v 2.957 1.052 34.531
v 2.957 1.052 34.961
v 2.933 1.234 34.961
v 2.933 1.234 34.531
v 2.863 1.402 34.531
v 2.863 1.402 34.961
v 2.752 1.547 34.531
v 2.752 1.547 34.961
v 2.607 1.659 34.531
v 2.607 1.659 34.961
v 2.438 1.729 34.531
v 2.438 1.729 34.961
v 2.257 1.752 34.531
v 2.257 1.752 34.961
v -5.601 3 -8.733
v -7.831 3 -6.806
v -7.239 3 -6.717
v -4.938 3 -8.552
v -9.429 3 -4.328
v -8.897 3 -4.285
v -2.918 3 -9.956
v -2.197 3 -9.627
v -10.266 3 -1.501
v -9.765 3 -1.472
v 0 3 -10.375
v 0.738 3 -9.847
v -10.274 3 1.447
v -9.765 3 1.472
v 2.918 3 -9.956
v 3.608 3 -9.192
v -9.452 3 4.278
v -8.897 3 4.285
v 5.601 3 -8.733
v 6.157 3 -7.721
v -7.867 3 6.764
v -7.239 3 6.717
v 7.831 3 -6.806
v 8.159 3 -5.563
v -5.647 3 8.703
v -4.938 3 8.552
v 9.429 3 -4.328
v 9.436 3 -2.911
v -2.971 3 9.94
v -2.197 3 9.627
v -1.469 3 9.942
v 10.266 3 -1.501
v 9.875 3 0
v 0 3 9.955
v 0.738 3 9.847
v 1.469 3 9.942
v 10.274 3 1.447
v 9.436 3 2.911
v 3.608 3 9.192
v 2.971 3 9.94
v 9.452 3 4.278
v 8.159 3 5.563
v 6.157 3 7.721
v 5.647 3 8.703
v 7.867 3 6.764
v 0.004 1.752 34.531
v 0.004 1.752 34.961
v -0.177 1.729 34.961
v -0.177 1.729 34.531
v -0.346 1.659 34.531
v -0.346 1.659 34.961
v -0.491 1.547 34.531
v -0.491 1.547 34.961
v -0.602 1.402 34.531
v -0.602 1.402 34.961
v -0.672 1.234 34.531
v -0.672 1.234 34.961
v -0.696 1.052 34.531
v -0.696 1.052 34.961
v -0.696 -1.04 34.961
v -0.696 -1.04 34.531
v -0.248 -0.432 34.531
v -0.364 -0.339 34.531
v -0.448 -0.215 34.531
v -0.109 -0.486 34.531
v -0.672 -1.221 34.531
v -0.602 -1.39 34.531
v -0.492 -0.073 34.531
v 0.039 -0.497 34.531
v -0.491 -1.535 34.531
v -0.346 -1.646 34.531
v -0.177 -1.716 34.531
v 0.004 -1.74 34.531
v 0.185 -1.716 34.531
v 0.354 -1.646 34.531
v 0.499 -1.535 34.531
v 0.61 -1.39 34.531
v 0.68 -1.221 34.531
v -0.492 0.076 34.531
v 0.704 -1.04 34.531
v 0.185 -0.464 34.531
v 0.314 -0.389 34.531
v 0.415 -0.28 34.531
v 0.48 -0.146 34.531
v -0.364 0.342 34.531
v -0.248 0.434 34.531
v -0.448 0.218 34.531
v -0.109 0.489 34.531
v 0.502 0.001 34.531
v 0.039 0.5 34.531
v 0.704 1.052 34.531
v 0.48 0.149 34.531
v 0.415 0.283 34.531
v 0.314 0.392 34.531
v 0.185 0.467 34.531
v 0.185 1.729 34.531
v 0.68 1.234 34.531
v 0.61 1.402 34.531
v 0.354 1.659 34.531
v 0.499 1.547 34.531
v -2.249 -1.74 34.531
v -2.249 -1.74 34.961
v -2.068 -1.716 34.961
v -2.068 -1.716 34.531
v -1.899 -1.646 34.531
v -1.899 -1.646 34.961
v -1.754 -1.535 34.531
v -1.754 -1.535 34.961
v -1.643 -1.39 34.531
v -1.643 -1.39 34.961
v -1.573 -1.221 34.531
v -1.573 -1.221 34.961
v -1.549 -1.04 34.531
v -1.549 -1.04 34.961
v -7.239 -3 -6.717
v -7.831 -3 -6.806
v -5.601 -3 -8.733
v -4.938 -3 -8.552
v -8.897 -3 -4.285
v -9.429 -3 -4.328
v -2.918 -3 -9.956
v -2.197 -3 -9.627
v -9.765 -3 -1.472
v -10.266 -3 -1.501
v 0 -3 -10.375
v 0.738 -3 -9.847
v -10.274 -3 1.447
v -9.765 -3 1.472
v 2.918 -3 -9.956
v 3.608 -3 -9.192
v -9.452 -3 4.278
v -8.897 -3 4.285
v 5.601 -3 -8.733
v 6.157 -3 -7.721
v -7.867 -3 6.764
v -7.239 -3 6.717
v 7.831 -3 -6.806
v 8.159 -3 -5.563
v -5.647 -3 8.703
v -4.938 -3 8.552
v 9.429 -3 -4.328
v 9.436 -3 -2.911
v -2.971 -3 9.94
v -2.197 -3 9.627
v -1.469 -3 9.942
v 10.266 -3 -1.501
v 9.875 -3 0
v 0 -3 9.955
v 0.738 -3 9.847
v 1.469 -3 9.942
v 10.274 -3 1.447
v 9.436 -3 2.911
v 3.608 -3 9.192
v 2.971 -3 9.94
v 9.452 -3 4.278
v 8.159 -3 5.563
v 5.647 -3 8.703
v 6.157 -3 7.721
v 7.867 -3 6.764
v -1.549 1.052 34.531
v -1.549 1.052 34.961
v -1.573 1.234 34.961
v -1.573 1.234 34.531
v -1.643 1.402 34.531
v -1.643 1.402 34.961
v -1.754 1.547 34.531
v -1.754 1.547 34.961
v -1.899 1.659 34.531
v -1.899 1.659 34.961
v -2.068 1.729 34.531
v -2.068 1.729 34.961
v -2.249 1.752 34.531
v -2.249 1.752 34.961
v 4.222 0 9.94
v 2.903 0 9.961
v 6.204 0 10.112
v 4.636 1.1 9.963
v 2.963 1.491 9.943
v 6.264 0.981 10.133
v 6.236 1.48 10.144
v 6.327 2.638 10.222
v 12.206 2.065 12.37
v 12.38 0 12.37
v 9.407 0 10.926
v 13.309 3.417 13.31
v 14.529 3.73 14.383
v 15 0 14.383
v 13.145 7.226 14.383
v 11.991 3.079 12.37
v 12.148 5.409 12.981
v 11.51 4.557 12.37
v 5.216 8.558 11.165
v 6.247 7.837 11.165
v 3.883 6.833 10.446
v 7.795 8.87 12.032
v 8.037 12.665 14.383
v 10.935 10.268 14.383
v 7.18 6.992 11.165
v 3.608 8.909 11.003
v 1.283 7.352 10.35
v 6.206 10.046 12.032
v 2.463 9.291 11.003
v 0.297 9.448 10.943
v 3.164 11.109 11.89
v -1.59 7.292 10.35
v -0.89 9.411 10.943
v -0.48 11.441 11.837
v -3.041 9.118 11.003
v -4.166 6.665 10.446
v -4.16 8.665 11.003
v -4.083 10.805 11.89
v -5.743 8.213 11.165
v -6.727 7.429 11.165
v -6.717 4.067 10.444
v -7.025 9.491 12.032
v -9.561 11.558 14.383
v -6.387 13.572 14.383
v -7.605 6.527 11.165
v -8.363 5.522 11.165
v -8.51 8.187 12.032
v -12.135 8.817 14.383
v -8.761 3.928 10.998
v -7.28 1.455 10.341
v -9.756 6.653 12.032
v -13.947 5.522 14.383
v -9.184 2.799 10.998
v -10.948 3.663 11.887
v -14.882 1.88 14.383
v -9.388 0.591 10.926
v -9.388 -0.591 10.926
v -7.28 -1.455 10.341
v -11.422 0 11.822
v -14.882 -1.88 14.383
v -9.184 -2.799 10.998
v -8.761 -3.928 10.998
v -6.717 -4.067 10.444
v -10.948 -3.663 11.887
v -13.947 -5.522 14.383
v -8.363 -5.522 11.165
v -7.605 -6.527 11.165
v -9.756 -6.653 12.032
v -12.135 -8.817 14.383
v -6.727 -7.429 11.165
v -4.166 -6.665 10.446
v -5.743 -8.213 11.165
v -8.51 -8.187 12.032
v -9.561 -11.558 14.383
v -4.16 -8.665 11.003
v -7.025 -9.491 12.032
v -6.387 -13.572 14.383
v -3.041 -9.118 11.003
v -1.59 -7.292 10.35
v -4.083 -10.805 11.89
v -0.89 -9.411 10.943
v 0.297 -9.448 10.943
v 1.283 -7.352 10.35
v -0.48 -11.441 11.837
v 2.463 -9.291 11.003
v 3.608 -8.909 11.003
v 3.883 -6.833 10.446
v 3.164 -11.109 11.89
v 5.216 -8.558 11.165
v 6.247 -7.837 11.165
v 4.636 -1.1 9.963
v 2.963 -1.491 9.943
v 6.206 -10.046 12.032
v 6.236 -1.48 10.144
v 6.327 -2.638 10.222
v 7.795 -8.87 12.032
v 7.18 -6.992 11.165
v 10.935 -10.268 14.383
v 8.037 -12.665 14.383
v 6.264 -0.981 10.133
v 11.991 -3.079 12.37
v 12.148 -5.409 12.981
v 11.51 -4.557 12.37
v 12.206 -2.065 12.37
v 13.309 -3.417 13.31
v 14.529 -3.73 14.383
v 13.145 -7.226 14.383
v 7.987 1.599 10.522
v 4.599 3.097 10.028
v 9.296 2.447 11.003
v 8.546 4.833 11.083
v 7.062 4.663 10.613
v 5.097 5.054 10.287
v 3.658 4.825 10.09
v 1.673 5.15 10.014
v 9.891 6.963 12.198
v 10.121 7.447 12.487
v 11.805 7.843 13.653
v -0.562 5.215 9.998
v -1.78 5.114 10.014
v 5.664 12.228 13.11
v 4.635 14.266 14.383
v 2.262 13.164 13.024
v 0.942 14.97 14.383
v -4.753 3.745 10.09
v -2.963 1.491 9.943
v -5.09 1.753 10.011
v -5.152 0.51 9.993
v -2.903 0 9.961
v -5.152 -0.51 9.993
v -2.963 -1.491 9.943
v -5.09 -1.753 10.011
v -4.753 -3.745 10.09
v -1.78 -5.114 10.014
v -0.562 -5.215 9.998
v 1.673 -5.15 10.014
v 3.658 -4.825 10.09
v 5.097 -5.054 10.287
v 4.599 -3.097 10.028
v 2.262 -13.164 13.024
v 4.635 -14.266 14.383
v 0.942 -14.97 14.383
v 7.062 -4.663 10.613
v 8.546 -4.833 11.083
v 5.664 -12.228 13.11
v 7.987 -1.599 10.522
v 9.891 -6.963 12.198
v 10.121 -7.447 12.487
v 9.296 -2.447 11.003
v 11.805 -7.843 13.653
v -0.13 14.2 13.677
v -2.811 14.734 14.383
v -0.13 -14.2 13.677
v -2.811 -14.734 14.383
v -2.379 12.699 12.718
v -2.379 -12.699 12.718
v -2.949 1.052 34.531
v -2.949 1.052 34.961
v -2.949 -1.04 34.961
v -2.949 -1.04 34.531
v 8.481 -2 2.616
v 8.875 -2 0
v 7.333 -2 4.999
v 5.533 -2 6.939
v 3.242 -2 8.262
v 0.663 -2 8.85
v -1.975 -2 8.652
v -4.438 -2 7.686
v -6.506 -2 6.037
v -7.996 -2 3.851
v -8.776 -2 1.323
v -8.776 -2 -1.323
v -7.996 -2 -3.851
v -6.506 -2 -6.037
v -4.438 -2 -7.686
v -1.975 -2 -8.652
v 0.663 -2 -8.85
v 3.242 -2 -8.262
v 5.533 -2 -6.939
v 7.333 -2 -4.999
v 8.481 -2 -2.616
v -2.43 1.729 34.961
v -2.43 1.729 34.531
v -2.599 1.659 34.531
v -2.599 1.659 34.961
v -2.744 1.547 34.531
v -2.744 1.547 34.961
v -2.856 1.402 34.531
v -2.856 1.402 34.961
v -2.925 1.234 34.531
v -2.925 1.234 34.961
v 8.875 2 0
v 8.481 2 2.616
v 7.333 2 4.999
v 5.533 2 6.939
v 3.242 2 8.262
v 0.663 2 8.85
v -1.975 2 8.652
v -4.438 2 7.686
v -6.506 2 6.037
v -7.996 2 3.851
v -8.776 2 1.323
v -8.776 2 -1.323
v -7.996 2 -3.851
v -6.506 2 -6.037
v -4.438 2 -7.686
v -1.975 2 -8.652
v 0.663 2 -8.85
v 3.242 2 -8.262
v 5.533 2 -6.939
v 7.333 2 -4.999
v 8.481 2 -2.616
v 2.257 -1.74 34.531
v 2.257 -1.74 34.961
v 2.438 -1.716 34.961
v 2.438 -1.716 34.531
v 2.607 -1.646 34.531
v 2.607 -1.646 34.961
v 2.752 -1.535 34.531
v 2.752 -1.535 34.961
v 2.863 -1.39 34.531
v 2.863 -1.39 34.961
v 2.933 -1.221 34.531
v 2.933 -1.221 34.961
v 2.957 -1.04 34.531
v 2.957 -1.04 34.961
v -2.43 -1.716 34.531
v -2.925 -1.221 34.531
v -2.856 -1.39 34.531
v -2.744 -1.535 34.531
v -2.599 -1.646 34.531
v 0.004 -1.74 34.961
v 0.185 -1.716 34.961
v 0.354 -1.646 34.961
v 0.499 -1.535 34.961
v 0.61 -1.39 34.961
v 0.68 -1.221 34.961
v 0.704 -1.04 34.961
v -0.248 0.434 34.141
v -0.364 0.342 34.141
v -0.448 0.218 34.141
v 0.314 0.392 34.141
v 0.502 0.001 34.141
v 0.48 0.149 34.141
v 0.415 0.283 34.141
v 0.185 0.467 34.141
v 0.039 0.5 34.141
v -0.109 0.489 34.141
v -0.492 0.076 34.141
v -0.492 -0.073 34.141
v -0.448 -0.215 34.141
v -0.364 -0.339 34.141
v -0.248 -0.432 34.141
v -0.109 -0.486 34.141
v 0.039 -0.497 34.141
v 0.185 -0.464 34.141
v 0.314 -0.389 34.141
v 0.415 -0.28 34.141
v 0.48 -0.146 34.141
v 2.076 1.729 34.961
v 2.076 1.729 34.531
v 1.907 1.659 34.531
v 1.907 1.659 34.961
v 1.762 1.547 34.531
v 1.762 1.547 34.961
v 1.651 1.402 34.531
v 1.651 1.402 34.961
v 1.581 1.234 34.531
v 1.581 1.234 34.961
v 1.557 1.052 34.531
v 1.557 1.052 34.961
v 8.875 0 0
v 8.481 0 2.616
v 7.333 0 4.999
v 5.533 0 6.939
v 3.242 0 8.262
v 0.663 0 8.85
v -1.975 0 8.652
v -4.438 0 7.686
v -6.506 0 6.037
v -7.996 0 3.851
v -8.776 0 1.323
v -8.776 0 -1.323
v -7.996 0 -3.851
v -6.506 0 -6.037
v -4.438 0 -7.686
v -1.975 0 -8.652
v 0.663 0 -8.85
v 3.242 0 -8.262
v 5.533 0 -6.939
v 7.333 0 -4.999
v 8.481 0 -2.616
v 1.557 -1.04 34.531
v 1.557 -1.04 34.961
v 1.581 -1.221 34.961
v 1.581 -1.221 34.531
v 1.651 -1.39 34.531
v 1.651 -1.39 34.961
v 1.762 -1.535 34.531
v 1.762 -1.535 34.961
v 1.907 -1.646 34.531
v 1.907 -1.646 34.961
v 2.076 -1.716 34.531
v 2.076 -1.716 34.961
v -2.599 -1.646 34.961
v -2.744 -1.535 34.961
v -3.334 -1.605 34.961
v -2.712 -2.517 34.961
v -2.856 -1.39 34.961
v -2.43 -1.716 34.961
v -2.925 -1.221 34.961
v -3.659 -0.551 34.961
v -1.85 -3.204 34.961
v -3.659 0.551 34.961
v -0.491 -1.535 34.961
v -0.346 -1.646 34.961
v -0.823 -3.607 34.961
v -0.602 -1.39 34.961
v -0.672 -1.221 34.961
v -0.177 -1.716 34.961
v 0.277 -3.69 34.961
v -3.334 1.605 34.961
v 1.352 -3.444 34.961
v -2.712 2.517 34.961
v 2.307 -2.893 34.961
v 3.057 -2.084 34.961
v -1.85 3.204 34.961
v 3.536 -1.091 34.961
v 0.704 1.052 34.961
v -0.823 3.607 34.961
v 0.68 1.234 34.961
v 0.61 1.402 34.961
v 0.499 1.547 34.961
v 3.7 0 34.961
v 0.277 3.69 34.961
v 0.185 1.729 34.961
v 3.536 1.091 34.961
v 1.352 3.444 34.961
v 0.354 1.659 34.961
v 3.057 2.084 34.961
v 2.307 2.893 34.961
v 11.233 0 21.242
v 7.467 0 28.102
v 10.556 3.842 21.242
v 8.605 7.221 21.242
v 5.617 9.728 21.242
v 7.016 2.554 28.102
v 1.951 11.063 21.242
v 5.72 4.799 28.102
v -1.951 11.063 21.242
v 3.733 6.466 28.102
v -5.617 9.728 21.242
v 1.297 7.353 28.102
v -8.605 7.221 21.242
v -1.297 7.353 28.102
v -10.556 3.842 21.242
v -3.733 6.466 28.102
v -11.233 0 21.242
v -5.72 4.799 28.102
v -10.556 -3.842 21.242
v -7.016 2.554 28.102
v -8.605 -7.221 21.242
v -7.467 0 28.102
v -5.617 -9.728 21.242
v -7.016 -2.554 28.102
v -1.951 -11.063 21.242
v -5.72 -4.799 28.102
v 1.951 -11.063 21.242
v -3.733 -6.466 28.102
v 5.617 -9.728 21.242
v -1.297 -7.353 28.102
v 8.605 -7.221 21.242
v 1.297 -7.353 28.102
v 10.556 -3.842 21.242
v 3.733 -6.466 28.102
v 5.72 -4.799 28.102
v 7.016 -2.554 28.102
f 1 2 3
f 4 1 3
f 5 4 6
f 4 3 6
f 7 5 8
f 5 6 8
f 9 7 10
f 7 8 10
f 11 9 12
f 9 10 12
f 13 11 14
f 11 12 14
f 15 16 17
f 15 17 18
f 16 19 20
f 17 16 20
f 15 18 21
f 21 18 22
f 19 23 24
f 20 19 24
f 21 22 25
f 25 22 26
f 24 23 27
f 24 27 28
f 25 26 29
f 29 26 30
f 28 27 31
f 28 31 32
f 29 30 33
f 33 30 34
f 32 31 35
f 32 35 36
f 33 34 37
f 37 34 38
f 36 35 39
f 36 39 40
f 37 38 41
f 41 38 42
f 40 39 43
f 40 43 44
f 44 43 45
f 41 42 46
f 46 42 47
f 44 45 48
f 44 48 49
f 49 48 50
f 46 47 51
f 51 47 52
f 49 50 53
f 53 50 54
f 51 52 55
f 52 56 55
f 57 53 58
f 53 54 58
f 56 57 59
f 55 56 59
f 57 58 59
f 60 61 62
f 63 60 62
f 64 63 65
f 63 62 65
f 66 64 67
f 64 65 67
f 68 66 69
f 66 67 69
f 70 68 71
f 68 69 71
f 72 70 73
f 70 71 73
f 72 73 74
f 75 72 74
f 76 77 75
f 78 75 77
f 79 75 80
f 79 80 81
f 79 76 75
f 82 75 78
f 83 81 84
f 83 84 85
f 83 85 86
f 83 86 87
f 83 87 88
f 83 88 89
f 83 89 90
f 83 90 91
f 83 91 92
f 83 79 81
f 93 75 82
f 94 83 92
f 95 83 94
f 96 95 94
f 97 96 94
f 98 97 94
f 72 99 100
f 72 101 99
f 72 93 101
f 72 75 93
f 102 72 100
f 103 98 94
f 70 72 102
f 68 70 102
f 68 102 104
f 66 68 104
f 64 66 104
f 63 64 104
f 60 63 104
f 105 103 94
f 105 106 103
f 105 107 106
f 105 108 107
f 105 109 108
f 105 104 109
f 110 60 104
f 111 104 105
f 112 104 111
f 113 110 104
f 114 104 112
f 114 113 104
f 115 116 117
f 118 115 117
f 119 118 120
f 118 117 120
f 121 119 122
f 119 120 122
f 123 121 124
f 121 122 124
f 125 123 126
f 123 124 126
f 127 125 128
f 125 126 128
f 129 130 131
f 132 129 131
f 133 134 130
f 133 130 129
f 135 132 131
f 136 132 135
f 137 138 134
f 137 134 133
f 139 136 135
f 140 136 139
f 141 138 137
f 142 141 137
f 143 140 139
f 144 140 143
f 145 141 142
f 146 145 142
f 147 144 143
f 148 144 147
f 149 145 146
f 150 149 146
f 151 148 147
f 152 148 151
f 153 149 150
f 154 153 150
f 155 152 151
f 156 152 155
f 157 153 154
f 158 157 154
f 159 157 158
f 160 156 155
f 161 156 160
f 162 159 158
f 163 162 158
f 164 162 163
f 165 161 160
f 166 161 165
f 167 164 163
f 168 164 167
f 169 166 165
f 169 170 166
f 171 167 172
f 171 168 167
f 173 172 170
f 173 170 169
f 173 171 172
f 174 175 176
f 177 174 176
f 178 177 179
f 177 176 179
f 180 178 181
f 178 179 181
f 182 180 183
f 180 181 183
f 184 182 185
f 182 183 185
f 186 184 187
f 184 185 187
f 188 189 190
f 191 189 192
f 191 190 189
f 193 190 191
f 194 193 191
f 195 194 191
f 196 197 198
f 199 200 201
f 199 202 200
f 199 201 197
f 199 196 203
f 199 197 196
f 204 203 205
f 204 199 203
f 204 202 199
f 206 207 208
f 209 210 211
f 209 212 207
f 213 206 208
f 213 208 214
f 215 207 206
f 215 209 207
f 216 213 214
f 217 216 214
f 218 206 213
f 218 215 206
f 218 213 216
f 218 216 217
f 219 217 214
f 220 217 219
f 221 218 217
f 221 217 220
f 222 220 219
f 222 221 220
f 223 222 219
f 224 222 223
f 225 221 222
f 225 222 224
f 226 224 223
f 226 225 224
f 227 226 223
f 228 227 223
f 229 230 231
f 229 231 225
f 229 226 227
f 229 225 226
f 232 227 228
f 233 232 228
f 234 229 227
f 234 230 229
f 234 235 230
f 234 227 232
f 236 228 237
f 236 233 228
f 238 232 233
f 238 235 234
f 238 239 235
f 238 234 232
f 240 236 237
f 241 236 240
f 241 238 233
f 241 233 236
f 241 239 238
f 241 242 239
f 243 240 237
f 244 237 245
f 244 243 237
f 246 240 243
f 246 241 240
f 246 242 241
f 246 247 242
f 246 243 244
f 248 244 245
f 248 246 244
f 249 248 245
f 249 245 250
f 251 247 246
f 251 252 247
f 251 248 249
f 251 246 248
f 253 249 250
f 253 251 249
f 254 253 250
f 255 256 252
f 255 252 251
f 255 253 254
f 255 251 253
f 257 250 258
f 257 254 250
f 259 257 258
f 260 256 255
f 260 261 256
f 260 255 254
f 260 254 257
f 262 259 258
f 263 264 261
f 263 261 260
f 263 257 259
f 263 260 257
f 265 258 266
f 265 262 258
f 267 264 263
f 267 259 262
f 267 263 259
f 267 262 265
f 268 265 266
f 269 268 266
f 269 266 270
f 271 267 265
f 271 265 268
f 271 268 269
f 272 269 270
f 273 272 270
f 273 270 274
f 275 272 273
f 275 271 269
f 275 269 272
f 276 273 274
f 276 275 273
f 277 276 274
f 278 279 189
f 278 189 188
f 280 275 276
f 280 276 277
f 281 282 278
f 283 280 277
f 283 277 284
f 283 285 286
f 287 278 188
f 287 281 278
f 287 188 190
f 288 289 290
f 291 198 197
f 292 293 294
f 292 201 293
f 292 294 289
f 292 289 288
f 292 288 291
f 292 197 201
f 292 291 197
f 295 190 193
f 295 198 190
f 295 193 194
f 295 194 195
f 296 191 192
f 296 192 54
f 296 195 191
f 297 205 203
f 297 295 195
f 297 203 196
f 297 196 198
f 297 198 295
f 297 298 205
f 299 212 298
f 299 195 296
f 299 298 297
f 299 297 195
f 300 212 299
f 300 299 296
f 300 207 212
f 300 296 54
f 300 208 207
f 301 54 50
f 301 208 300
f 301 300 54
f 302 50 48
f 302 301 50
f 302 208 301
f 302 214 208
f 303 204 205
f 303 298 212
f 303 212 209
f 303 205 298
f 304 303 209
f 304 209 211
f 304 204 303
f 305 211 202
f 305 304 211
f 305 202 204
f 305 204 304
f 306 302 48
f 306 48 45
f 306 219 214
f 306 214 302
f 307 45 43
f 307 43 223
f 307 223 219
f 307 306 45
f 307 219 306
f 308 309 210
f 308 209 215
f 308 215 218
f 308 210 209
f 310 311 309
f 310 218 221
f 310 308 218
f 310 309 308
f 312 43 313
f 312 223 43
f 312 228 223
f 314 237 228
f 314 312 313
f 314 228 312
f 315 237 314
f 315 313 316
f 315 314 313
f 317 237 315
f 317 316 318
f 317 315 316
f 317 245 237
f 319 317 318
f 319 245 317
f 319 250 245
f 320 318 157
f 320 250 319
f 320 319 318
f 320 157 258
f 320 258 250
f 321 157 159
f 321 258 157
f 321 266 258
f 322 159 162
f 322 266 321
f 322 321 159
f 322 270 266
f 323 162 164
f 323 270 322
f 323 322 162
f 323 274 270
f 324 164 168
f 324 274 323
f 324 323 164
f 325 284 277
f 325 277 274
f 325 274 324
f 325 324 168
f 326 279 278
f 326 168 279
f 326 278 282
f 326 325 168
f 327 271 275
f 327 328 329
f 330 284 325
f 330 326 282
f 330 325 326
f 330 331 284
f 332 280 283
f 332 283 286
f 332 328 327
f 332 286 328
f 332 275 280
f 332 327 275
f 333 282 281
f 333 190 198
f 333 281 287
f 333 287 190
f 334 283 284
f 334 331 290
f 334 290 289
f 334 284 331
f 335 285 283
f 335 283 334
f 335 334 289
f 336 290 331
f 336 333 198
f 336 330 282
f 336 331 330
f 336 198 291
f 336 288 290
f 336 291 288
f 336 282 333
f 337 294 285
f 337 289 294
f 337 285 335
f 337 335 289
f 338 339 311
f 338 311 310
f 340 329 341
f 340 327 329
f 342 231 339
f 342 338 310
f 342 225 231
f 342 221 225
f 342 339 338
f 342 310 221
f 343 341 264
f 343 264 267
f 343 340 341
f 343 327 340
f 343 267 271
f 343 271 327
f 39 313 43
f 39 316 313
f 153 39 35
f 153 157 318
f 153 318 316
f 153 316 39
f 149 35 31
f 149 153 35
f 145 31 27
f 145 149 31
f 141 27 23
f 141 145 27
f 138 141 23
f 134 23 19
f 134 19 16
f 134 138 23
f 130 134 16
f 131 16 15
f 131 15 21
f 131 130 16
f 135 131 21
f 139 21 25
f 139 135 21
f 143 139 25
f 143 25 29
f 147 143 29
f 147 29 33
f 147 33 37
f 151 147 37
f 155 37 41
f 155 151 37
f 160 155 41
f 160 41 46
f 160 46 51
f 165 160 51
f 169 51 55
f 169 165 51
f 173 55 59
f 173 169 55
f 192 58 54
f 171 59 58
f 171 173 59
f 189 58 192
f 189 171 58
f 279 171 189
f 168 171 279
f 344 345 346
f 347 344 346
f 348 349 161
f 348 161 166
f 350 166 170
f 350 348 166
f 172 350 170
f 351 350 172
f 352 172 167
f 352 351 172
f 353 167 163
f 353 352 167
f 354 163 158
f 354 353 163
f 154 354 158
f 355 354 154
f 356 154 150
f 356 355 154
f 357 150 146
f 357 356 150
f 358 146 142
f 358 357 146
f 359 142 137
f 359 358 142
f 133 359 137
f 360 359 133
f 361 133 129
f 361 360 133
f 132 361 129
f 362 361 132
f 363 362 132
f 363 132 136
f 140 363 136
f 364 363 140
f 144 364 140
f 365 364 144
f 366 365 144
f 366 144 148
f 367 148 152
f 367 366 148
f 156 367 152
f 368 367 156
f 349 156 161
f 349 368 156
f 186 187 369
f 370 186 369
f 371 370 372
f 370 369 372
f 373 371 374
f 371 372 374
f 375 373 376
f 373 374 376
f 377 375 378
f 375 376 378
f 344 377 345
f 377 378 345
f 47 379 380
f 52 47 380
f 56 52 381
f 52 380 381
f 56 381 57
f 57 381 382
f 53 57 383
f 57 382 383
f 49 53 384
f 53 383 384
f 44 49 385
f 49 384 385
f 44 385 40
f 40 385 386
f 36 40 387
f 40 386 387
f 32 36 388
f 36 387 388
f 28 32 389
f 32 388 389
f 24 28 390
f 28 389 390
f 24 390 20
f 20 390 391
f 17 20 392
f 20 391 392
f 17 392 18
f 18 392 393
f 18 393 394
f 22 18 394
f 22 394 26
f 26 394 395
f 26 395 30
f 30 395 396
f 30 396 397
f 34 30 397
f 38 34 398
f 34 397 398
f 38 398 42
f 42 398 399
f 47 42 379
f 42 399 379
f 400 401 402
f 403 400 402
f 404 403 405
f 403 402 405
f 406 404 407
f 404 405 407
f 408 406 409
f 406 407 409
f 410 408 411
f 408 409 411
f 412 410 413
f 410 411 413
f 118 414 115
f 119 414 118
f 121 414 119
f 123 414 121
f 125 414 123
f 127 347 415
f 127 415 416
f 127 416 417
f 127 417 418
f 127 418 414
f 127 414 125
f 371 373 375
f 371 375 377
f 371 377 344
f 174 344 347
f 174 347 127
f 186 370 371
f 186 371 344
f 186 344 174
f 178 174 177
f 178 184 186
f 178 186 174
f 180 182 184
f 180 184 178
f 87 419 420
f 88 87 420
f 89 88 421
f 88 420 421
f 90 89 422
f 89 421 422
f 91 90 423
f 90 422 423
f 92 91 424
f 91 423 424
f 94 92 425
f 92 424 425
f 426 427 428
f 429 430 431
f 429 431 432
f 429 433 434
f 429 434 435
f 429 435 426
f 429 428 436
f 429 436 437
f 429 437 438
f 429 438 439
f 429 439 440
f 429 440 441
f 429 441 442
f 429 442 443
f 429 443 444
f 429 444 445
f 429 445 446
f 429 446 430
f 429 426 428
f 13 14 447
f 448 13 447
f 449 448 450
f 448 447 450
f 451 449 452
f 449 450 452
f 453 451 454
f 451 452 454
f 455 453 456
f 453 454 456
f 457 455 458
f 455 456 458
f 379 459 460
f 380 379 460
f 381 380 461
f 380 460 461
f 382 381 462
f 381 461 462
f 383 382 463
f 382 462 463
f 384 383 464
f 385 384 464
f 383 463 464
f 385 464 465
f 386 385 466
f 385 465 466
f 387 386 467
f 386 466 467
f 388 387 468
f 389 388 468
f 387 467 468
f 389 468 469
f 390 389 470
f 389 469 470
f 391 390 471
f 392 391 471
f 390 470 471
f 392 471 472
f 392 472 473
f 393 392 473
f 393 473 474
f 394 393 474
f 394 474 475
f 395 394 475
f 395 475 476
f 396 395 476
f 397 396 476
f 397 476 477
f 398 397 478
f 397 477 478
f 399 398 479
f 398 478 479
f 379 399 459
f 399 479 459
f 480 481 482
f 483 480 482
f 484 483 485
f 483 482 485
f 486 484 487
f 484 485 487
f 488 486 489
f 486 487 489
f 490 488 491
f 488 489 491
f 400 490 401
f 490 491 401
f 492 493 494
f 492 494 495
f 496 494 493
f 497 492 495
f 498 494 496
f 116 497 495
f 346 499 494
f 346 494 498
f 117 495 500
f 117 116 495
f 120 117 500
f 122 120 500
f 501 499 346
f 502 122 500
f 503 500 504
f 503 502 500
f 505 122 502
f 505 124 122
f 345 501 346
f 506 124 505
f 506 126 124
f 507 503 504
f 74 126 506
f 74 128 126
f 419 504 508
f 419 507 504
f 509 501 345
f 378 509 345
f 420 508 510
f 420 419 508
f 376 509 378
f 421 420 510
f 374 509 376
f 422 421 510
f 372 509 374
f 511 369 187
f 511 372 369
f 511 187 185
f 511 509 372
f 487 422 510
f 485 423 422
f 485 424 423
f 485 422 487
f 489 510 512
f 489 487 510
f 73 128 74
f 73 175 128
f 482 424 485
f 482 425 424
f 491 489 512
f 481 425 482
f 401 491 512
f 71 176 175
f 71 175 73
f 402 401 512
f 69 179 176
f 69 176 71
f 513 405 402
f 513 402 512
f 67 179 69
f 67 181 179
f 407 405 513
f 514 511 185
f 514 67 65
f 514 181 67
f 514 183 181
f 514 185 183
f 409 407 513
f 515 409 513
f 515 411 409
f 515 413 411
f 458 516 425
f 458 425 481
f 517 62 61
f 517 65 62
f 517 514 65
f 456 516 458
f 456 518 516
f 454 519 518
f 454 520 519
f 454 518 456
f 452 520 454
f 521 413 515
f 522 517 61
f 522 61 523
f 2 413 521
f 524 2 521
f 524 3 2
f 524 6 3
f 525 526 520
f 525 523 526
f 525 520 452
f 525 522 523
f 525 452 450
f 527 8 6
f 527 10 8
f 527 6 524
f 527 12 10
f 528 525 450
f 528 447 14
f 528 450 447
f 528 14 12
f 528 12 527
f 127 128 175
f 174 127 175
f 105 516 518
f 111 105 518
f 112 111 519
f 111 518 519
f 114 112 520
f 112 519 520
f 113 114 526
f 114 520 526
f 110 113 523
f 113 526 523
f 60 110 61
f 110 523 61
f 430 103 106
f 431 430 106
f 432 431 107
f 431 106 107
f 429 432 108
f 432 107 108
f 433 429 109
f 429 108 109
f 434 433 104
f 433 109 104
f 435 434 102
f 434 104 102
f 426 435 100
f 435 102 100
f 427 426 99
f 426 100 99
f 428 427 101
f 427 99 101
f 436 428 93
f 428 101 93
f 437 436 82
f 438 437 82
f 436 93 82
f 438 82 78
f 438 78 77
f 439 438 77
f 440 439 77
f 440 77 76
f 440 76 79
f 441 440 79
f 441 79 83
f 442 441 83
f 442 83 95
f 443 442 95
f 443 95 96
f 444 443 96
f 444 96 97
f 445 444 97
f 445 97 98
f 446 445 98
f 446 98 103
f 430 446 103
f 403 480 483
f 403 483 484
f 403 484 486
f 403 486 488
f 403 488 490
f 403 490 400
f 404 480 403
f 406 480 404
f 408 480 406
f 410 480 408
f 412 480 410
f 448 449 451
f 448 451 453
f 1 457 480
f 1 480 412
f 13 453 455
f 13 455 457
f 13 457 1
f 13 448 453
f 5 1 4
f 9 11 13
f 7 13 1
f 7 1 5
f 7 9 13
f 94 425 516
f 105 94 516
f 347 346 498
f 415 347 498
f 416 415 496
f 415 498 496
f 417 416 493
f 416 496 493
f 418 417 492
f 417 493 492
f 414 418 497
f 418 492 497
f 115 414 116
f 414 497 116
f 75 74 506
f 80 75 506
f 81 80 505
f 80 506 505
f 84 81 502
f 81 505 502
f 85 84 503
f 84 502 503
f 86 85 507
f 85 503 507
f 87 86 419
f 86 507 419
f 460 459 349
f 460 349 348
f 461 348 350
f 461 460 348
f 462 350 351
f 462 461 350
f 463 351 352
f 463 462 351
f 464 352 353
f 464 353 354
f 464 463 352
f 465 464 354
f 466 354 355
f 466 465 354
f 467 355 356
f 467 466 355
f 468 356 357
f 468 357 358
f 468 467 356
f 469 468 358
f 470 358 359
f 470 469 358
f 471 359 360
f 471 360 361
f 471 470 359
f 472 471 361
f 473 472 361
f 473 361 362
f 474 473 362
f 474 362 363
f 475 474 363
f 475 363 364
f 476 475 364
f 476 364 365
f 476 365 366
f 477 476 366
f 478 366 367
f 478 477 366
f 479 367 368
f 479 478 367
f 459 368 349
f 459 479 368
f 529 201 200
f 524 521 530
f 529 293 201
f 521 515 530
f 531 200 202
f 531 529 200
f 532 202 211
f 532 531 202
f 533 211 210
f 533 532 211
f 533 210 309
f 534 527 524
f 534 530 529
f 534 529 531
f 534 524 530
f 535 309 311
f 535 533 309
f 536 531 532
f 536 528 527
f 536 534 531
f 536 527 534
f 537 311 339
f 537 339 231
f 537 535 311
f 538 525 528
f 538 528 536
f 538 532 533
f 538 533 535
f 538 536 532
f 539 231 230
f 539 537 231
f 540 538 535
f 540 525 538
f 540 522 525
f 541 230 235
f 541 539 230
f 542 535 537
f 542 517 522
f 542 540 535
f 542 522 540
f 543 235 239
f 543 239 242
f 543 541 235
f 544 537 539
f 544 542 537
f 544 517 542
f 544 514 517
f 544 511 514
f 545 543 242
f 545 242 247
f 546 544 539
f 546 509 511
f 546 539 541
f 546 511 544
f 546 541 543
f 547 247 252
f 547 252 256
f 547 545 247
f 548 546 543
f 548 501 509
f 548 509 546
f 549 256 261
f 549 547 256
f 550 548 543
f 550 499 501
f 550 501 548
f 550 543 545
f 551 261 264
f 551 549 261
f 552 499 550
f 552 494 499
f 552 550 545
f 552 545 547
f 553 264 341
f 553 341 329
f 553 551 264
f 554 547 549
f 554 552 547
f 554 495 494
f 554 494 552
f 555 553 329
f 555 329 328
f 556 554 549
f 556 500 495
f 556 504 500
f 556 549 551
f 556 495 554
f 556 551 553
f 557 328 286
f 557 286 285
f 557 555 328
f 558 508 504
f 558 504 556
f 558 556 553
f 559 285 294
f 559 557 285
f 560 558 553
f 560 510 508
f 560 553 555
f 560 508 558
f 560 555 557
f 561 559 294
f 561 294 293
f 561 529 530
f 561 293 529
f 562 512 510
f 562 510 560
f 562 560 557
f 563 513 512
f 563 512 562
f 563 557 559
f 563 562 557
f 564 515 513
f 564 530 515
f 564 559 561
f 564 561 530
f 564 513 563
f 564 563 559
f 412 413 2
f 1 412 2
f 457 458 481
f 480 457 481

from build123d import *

# Parameters (mm, degrees)
F0_R          = 8.875
F3_DEPTH      = 3
F3_DEPTH_BACK = 3
F4_SIZE       = 1
F5_R          = 0.5
F6_DEPTH      = 0.43
F7_DEPTH      = 0.82


with BuildPart() as f2:
    # F0 (on Front) → F2 (revolve)
    with BuildSketch(Plane.XZ):
        with BuildLine():
            ThreePointArc((0, 10.375), (1.4661242569, 10.2708862647), (2.9028232275, 9.9606346339))
            ThreePointArc((2.9028232275, 9.9606346339), (9.4069705736, 10.9259285589), (15, 14.3833476682))
            Line((15, 14.3833476682), (3.7, 34.9606346339))
            Line((3.7, 34.9606346339), (0, 34.9606346339))
            Line((0, 34.9606346339), (0, 10.375))
        make_face()
    revolve(axis=Axis((0, 0, 0), (0, 0, 1)))

    # F0 (on Front) → F3 (join, two sides)
    with BuildSketch(Plane.XZ) as f3_sk:
        with BuildLine():
            ThreePointArc((0, 10.375), (-7.3362328548, -7.3362328548), (10.375, 0))
            ThreePointArc((10.375, 0), (8.2993197307, 6.2259069225), (2.9028232275, 9.9606346339))
            Line((2.9028232275, 9.9606346339), (0, 9.9606346339))
            Line((0, 9.9606346339), (0, 10.375))
        make_face()
        Circle(F0_R, mode=Mode.SUBTRACT)
        with BuildLine():
            Line((0, 9.9606346339), (2.9028232275, 9.9606346339))
            ThreePointArc((2.9028232275, 9.9606346339), (1.4661242569, 10.2708862647), (0, 10.375))
            Line((0, 10.375), (0, 9.9606346339))
        make_face()
    extrude(amount=F3_DEPTH)
    extrude(f3_sk.sketch, amount=-F3_DEPTH_BACK)

    # F4
    f4_edges = [f2.edges().sort_by_distance(p)[0] for p in [
        (-8.875, -3, 0),
        (-8.875, 3, 0),
    ]]
    chamfer(f4_edges, length=F4_SIZE)

    # F5 (on face) → F6 (cut)
    with BuildSketch(Plane.XY.offset(34.9606346339)):
        with BuildLine():
            ThreePointArc((0.0041443855, 1.7524251654), (-0.4908303614, 1.5473999123), (-0.6958556145, 1.0524251654))
            Line((-0.6958556145, 1.0524251654), (-0.6958556145, -1.0399995122))
            ThreePointArc((-0.6958556145, -1.0399995122), (-0.4908303614, -1.534974259), (0.0041443855, -1.7399995122))
            ThreePointArc((0.0041443855, -1.7399995122), (0.4991191323, -1.534974259), (0.7041443855, -1.0399995122))
            Line((0.7041443855, -1.0399995122), (0.7041443855, 1.0524251654))
            ThreePointArc((0.7041443855, 1.0524251654), (0.4991191323, 1.5473999123), (0.0041443855, 1.7524251654))
        make_face()
        with Locations((0.0021327037, 0.0014704808)):
            Circle(F5_R, mode=Mode.SUBTRACT)
        with BuildLine():
            ThreePointArc((-2.2493049037, 1.7524251654), (-2.7442796505, 1.5473999123), (-2.9493049037, 1.0524251654))
            Line((-2.9493049037, 1.0524251654), (-2.9493049037, -1.0399995122))
            ThreePointArc((-2.9493049037, -1.0399995122), (-2.7442796505, -1.534974259), (-2.2493049037, -1.7399995122))
            ThreePointArc((-2.2493049037, -1.7399995122), (-1.7543301568, -1.534974259), (-1.5493049037, -1.0399995122))
            Line((-1.5493049037, -1.0399995122), (-1.5493049037, 1.0524251654))
            ThreePointArc((-1.5493049037, 1.0524251654), (-1.7543301568, 1.5473999123), (-2.2493049037, 1.7524251654))
        make_face()
        with BuildLine():
            ThreePointArc((2.2571443855, 1.7524251654), (1.7621696386, 1.5473999123), (1.5571443855, 1.0524251654))
            Line((1.5571443855, 1.0524251654), (1.5571443855, -1.0399995122))
            ThreePointArc((1.5571443855, -1.0399995122), (1.7621696386, -1.534974259), (2.2571443855, -1.7399995122))
            ThreePointArc((2.2571443855, -1.7399995122), (2.7521191323, -1.534974259), (2.9571443855, -1.0399995122))
            Line((2.9571443855, -1.0399995122), (2.9571443855, 1.0524251654))
            ThreePointArc((2.9571443855, 1.0524251654), (2.7521191323, 1.5473999123), (2.2571443855, 1.7524251654))
        make_face()
    extrude(amount=-F6_DEPTH, mode=Mode.SUBTRACT)

    # F7 (cut): a face of the model
    f7_faces = [f2.faces().sort_by_distance(p)[0] for p in [
        (0.0021327037, 0.0014704808, 34.9606346339),
    ]]
    extrude(f7_faces, amount=-F7_DEPTH, mode=Mode.SUBTRACT)


solid = f2.part
